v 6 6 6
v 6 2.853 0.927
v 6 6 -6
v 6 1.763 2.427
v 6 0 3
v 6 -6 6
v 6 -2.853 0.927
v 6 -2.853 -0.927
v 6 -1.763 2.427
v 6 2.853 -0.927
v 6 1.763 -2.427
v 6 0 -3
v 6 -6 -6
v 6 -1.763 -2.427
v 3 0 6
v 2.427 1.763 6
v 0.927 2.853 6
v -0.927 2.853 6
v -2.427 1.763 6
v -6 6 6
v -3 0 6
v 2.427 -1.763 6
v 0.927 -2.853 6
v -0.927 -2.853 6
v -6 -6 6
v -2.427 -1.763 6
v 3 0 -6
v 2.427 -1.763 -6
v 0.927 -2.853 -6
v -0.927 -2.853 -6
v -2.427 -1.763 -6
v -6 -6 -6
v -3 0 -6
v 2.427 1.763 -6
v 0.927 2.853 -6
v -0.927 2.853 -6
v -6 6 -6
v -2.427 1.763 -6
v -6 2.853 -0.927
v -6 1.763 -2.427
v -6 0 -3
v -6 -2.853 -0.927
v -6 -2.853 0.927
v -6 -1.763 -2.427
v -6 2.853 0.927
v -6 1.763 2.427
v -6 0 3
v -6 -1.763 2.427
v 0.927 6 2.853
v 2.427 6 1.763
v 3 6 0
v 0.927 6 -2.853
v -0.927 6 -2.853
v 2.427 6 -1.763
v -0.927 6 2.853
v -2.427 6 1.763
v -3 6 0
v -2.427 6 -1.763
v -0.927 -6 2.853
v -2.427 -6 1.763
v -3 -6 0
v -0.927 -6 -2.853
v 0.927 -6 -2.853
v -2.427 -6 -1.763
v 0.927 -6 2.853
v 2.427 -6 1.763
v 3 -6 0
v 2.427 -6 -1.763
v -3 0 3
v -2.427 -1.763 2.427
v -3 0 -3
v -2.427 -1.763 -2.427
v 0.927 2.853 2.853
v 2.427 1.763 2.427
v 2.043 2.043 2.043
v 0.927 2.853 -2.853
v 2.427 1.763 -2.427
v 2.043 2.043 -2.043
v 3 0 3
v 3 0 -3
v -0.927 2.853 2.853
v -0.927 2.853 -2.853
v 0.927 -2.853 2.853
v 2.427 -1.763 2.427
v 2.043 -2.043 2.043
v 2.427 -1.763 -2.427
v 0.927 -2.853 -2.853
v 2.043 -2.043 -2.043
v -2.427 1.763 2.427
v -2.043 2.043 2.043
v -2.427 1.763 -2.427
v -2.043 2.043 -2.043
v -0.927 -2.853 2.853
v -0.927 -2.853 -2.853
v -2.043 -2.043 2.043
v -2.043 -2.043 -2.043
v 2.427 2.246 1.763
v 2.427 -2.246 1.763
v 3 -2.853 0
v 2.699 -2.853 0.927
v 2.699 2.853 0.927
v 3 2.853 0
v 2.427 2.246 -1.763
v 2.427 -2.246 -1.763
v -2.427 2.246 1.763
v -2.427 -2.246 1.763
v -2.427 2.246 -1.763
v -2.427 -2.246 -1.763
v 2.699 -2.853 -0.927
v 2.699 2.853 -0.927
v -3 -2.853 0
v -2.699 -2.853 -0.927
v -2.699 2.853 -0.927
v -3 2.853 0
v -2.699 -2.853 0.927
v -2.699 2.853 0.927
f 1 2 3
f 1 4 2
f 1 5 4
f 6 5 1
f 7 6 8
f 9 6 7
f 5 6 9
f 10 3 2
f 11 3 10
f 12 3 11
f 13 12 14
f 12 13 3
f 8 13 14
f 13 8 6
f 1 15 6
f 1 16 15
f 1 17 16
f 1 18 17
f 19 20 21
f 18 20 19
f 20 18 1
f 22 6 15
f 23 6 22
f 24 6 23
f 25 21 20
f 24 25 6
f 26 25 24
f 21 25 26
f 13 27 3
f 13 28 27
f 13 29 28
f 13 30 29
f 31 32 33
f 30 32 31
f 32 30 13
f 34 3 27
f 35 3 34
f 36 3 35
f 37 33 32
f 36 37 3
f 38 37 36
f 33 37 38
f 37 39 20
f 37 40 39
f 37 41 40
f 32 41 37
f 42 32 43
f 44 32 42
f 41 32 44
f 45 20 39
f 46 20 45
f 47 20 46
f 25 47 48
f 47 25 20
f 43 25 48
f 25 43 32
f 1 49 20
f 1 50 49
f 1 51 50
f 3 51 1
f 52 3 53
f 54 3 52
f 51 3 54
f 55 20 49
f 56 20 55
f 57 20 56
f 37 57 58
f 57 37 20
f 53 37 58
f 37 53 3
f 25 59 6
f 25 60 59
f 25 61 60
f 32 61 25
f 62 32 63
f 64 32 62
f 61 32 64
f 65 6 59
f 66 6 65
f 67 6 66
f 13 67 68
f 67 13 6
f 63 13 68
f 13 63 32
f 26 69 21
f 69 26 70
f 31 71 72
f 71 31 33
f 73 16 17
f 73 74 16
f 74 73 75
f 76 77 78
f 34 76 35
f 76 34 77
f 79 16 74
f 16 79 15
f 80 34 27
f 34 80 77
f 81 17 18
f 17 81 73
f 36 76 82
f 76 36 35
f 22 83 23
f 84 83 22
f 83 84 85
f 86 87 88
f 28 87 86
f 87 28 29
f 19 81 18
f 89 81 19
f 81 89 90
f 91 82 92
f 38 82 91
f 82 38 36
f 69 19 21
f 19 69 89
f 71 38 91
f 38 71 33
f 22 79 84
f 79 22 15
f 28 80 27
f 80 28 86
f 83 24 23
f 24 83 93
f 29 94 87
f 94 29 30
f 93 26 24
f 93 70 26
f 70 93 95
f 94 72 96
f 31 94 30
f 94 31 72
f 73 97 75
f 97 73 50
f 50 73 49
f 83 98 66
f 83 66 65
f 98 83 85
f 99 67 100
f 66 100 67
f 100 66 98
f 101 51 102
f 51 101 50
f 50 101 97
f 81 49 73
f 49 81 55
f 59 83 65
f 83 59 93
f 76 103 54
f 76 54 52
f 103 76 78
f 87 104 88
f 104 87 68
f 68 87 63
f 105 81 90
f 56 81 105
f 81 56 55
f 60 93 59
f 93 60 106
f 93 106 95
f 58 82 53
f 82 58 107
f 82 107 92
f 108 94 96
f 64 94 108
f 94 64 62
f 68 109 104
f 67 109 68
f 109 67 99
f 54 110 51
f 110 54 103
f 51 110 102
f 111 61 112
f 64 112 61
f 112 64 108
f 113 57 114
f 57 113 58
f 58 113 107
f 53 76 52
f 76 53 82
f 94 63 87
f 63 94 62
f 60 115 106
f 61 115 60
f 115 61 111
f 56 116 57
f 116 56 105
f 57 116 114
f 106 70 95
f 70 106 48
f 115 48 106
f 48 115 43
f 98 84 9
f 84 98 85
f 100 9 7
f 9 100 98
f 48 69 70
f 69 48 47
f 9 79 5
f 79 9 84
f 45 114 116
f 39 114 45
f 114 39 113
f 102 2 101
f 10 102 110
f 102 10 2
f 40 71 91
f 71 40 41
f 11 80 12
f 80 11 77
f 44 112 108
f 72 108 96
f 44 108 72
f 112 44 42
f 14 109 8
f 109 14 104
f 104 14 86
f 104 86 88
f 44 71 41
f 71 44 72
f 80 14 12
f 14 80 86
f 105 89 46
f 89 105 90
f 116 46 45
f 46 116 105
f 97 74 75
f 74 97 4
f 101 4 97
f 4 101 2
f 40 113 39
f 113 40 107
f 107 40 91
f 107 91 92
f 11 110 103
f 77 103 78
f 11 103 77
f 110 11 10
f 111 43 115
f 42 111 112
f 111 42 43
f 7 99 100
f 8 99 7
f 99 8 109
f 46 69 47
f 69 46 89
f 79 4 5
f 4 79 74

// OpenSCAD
// Cube with 3 orthogonal cylinder holes — tests difference with rotated primitives
difference() {
    cube([12, 12, 12], center=true);
    cylinder(h=14, r=3, center=true);
    rotate([90, 0, 0]) cylinder(h=14, r=3, center=true);
    rotate([0, 90, 0]) cylinder(h=14, r=3, center=true);
}
